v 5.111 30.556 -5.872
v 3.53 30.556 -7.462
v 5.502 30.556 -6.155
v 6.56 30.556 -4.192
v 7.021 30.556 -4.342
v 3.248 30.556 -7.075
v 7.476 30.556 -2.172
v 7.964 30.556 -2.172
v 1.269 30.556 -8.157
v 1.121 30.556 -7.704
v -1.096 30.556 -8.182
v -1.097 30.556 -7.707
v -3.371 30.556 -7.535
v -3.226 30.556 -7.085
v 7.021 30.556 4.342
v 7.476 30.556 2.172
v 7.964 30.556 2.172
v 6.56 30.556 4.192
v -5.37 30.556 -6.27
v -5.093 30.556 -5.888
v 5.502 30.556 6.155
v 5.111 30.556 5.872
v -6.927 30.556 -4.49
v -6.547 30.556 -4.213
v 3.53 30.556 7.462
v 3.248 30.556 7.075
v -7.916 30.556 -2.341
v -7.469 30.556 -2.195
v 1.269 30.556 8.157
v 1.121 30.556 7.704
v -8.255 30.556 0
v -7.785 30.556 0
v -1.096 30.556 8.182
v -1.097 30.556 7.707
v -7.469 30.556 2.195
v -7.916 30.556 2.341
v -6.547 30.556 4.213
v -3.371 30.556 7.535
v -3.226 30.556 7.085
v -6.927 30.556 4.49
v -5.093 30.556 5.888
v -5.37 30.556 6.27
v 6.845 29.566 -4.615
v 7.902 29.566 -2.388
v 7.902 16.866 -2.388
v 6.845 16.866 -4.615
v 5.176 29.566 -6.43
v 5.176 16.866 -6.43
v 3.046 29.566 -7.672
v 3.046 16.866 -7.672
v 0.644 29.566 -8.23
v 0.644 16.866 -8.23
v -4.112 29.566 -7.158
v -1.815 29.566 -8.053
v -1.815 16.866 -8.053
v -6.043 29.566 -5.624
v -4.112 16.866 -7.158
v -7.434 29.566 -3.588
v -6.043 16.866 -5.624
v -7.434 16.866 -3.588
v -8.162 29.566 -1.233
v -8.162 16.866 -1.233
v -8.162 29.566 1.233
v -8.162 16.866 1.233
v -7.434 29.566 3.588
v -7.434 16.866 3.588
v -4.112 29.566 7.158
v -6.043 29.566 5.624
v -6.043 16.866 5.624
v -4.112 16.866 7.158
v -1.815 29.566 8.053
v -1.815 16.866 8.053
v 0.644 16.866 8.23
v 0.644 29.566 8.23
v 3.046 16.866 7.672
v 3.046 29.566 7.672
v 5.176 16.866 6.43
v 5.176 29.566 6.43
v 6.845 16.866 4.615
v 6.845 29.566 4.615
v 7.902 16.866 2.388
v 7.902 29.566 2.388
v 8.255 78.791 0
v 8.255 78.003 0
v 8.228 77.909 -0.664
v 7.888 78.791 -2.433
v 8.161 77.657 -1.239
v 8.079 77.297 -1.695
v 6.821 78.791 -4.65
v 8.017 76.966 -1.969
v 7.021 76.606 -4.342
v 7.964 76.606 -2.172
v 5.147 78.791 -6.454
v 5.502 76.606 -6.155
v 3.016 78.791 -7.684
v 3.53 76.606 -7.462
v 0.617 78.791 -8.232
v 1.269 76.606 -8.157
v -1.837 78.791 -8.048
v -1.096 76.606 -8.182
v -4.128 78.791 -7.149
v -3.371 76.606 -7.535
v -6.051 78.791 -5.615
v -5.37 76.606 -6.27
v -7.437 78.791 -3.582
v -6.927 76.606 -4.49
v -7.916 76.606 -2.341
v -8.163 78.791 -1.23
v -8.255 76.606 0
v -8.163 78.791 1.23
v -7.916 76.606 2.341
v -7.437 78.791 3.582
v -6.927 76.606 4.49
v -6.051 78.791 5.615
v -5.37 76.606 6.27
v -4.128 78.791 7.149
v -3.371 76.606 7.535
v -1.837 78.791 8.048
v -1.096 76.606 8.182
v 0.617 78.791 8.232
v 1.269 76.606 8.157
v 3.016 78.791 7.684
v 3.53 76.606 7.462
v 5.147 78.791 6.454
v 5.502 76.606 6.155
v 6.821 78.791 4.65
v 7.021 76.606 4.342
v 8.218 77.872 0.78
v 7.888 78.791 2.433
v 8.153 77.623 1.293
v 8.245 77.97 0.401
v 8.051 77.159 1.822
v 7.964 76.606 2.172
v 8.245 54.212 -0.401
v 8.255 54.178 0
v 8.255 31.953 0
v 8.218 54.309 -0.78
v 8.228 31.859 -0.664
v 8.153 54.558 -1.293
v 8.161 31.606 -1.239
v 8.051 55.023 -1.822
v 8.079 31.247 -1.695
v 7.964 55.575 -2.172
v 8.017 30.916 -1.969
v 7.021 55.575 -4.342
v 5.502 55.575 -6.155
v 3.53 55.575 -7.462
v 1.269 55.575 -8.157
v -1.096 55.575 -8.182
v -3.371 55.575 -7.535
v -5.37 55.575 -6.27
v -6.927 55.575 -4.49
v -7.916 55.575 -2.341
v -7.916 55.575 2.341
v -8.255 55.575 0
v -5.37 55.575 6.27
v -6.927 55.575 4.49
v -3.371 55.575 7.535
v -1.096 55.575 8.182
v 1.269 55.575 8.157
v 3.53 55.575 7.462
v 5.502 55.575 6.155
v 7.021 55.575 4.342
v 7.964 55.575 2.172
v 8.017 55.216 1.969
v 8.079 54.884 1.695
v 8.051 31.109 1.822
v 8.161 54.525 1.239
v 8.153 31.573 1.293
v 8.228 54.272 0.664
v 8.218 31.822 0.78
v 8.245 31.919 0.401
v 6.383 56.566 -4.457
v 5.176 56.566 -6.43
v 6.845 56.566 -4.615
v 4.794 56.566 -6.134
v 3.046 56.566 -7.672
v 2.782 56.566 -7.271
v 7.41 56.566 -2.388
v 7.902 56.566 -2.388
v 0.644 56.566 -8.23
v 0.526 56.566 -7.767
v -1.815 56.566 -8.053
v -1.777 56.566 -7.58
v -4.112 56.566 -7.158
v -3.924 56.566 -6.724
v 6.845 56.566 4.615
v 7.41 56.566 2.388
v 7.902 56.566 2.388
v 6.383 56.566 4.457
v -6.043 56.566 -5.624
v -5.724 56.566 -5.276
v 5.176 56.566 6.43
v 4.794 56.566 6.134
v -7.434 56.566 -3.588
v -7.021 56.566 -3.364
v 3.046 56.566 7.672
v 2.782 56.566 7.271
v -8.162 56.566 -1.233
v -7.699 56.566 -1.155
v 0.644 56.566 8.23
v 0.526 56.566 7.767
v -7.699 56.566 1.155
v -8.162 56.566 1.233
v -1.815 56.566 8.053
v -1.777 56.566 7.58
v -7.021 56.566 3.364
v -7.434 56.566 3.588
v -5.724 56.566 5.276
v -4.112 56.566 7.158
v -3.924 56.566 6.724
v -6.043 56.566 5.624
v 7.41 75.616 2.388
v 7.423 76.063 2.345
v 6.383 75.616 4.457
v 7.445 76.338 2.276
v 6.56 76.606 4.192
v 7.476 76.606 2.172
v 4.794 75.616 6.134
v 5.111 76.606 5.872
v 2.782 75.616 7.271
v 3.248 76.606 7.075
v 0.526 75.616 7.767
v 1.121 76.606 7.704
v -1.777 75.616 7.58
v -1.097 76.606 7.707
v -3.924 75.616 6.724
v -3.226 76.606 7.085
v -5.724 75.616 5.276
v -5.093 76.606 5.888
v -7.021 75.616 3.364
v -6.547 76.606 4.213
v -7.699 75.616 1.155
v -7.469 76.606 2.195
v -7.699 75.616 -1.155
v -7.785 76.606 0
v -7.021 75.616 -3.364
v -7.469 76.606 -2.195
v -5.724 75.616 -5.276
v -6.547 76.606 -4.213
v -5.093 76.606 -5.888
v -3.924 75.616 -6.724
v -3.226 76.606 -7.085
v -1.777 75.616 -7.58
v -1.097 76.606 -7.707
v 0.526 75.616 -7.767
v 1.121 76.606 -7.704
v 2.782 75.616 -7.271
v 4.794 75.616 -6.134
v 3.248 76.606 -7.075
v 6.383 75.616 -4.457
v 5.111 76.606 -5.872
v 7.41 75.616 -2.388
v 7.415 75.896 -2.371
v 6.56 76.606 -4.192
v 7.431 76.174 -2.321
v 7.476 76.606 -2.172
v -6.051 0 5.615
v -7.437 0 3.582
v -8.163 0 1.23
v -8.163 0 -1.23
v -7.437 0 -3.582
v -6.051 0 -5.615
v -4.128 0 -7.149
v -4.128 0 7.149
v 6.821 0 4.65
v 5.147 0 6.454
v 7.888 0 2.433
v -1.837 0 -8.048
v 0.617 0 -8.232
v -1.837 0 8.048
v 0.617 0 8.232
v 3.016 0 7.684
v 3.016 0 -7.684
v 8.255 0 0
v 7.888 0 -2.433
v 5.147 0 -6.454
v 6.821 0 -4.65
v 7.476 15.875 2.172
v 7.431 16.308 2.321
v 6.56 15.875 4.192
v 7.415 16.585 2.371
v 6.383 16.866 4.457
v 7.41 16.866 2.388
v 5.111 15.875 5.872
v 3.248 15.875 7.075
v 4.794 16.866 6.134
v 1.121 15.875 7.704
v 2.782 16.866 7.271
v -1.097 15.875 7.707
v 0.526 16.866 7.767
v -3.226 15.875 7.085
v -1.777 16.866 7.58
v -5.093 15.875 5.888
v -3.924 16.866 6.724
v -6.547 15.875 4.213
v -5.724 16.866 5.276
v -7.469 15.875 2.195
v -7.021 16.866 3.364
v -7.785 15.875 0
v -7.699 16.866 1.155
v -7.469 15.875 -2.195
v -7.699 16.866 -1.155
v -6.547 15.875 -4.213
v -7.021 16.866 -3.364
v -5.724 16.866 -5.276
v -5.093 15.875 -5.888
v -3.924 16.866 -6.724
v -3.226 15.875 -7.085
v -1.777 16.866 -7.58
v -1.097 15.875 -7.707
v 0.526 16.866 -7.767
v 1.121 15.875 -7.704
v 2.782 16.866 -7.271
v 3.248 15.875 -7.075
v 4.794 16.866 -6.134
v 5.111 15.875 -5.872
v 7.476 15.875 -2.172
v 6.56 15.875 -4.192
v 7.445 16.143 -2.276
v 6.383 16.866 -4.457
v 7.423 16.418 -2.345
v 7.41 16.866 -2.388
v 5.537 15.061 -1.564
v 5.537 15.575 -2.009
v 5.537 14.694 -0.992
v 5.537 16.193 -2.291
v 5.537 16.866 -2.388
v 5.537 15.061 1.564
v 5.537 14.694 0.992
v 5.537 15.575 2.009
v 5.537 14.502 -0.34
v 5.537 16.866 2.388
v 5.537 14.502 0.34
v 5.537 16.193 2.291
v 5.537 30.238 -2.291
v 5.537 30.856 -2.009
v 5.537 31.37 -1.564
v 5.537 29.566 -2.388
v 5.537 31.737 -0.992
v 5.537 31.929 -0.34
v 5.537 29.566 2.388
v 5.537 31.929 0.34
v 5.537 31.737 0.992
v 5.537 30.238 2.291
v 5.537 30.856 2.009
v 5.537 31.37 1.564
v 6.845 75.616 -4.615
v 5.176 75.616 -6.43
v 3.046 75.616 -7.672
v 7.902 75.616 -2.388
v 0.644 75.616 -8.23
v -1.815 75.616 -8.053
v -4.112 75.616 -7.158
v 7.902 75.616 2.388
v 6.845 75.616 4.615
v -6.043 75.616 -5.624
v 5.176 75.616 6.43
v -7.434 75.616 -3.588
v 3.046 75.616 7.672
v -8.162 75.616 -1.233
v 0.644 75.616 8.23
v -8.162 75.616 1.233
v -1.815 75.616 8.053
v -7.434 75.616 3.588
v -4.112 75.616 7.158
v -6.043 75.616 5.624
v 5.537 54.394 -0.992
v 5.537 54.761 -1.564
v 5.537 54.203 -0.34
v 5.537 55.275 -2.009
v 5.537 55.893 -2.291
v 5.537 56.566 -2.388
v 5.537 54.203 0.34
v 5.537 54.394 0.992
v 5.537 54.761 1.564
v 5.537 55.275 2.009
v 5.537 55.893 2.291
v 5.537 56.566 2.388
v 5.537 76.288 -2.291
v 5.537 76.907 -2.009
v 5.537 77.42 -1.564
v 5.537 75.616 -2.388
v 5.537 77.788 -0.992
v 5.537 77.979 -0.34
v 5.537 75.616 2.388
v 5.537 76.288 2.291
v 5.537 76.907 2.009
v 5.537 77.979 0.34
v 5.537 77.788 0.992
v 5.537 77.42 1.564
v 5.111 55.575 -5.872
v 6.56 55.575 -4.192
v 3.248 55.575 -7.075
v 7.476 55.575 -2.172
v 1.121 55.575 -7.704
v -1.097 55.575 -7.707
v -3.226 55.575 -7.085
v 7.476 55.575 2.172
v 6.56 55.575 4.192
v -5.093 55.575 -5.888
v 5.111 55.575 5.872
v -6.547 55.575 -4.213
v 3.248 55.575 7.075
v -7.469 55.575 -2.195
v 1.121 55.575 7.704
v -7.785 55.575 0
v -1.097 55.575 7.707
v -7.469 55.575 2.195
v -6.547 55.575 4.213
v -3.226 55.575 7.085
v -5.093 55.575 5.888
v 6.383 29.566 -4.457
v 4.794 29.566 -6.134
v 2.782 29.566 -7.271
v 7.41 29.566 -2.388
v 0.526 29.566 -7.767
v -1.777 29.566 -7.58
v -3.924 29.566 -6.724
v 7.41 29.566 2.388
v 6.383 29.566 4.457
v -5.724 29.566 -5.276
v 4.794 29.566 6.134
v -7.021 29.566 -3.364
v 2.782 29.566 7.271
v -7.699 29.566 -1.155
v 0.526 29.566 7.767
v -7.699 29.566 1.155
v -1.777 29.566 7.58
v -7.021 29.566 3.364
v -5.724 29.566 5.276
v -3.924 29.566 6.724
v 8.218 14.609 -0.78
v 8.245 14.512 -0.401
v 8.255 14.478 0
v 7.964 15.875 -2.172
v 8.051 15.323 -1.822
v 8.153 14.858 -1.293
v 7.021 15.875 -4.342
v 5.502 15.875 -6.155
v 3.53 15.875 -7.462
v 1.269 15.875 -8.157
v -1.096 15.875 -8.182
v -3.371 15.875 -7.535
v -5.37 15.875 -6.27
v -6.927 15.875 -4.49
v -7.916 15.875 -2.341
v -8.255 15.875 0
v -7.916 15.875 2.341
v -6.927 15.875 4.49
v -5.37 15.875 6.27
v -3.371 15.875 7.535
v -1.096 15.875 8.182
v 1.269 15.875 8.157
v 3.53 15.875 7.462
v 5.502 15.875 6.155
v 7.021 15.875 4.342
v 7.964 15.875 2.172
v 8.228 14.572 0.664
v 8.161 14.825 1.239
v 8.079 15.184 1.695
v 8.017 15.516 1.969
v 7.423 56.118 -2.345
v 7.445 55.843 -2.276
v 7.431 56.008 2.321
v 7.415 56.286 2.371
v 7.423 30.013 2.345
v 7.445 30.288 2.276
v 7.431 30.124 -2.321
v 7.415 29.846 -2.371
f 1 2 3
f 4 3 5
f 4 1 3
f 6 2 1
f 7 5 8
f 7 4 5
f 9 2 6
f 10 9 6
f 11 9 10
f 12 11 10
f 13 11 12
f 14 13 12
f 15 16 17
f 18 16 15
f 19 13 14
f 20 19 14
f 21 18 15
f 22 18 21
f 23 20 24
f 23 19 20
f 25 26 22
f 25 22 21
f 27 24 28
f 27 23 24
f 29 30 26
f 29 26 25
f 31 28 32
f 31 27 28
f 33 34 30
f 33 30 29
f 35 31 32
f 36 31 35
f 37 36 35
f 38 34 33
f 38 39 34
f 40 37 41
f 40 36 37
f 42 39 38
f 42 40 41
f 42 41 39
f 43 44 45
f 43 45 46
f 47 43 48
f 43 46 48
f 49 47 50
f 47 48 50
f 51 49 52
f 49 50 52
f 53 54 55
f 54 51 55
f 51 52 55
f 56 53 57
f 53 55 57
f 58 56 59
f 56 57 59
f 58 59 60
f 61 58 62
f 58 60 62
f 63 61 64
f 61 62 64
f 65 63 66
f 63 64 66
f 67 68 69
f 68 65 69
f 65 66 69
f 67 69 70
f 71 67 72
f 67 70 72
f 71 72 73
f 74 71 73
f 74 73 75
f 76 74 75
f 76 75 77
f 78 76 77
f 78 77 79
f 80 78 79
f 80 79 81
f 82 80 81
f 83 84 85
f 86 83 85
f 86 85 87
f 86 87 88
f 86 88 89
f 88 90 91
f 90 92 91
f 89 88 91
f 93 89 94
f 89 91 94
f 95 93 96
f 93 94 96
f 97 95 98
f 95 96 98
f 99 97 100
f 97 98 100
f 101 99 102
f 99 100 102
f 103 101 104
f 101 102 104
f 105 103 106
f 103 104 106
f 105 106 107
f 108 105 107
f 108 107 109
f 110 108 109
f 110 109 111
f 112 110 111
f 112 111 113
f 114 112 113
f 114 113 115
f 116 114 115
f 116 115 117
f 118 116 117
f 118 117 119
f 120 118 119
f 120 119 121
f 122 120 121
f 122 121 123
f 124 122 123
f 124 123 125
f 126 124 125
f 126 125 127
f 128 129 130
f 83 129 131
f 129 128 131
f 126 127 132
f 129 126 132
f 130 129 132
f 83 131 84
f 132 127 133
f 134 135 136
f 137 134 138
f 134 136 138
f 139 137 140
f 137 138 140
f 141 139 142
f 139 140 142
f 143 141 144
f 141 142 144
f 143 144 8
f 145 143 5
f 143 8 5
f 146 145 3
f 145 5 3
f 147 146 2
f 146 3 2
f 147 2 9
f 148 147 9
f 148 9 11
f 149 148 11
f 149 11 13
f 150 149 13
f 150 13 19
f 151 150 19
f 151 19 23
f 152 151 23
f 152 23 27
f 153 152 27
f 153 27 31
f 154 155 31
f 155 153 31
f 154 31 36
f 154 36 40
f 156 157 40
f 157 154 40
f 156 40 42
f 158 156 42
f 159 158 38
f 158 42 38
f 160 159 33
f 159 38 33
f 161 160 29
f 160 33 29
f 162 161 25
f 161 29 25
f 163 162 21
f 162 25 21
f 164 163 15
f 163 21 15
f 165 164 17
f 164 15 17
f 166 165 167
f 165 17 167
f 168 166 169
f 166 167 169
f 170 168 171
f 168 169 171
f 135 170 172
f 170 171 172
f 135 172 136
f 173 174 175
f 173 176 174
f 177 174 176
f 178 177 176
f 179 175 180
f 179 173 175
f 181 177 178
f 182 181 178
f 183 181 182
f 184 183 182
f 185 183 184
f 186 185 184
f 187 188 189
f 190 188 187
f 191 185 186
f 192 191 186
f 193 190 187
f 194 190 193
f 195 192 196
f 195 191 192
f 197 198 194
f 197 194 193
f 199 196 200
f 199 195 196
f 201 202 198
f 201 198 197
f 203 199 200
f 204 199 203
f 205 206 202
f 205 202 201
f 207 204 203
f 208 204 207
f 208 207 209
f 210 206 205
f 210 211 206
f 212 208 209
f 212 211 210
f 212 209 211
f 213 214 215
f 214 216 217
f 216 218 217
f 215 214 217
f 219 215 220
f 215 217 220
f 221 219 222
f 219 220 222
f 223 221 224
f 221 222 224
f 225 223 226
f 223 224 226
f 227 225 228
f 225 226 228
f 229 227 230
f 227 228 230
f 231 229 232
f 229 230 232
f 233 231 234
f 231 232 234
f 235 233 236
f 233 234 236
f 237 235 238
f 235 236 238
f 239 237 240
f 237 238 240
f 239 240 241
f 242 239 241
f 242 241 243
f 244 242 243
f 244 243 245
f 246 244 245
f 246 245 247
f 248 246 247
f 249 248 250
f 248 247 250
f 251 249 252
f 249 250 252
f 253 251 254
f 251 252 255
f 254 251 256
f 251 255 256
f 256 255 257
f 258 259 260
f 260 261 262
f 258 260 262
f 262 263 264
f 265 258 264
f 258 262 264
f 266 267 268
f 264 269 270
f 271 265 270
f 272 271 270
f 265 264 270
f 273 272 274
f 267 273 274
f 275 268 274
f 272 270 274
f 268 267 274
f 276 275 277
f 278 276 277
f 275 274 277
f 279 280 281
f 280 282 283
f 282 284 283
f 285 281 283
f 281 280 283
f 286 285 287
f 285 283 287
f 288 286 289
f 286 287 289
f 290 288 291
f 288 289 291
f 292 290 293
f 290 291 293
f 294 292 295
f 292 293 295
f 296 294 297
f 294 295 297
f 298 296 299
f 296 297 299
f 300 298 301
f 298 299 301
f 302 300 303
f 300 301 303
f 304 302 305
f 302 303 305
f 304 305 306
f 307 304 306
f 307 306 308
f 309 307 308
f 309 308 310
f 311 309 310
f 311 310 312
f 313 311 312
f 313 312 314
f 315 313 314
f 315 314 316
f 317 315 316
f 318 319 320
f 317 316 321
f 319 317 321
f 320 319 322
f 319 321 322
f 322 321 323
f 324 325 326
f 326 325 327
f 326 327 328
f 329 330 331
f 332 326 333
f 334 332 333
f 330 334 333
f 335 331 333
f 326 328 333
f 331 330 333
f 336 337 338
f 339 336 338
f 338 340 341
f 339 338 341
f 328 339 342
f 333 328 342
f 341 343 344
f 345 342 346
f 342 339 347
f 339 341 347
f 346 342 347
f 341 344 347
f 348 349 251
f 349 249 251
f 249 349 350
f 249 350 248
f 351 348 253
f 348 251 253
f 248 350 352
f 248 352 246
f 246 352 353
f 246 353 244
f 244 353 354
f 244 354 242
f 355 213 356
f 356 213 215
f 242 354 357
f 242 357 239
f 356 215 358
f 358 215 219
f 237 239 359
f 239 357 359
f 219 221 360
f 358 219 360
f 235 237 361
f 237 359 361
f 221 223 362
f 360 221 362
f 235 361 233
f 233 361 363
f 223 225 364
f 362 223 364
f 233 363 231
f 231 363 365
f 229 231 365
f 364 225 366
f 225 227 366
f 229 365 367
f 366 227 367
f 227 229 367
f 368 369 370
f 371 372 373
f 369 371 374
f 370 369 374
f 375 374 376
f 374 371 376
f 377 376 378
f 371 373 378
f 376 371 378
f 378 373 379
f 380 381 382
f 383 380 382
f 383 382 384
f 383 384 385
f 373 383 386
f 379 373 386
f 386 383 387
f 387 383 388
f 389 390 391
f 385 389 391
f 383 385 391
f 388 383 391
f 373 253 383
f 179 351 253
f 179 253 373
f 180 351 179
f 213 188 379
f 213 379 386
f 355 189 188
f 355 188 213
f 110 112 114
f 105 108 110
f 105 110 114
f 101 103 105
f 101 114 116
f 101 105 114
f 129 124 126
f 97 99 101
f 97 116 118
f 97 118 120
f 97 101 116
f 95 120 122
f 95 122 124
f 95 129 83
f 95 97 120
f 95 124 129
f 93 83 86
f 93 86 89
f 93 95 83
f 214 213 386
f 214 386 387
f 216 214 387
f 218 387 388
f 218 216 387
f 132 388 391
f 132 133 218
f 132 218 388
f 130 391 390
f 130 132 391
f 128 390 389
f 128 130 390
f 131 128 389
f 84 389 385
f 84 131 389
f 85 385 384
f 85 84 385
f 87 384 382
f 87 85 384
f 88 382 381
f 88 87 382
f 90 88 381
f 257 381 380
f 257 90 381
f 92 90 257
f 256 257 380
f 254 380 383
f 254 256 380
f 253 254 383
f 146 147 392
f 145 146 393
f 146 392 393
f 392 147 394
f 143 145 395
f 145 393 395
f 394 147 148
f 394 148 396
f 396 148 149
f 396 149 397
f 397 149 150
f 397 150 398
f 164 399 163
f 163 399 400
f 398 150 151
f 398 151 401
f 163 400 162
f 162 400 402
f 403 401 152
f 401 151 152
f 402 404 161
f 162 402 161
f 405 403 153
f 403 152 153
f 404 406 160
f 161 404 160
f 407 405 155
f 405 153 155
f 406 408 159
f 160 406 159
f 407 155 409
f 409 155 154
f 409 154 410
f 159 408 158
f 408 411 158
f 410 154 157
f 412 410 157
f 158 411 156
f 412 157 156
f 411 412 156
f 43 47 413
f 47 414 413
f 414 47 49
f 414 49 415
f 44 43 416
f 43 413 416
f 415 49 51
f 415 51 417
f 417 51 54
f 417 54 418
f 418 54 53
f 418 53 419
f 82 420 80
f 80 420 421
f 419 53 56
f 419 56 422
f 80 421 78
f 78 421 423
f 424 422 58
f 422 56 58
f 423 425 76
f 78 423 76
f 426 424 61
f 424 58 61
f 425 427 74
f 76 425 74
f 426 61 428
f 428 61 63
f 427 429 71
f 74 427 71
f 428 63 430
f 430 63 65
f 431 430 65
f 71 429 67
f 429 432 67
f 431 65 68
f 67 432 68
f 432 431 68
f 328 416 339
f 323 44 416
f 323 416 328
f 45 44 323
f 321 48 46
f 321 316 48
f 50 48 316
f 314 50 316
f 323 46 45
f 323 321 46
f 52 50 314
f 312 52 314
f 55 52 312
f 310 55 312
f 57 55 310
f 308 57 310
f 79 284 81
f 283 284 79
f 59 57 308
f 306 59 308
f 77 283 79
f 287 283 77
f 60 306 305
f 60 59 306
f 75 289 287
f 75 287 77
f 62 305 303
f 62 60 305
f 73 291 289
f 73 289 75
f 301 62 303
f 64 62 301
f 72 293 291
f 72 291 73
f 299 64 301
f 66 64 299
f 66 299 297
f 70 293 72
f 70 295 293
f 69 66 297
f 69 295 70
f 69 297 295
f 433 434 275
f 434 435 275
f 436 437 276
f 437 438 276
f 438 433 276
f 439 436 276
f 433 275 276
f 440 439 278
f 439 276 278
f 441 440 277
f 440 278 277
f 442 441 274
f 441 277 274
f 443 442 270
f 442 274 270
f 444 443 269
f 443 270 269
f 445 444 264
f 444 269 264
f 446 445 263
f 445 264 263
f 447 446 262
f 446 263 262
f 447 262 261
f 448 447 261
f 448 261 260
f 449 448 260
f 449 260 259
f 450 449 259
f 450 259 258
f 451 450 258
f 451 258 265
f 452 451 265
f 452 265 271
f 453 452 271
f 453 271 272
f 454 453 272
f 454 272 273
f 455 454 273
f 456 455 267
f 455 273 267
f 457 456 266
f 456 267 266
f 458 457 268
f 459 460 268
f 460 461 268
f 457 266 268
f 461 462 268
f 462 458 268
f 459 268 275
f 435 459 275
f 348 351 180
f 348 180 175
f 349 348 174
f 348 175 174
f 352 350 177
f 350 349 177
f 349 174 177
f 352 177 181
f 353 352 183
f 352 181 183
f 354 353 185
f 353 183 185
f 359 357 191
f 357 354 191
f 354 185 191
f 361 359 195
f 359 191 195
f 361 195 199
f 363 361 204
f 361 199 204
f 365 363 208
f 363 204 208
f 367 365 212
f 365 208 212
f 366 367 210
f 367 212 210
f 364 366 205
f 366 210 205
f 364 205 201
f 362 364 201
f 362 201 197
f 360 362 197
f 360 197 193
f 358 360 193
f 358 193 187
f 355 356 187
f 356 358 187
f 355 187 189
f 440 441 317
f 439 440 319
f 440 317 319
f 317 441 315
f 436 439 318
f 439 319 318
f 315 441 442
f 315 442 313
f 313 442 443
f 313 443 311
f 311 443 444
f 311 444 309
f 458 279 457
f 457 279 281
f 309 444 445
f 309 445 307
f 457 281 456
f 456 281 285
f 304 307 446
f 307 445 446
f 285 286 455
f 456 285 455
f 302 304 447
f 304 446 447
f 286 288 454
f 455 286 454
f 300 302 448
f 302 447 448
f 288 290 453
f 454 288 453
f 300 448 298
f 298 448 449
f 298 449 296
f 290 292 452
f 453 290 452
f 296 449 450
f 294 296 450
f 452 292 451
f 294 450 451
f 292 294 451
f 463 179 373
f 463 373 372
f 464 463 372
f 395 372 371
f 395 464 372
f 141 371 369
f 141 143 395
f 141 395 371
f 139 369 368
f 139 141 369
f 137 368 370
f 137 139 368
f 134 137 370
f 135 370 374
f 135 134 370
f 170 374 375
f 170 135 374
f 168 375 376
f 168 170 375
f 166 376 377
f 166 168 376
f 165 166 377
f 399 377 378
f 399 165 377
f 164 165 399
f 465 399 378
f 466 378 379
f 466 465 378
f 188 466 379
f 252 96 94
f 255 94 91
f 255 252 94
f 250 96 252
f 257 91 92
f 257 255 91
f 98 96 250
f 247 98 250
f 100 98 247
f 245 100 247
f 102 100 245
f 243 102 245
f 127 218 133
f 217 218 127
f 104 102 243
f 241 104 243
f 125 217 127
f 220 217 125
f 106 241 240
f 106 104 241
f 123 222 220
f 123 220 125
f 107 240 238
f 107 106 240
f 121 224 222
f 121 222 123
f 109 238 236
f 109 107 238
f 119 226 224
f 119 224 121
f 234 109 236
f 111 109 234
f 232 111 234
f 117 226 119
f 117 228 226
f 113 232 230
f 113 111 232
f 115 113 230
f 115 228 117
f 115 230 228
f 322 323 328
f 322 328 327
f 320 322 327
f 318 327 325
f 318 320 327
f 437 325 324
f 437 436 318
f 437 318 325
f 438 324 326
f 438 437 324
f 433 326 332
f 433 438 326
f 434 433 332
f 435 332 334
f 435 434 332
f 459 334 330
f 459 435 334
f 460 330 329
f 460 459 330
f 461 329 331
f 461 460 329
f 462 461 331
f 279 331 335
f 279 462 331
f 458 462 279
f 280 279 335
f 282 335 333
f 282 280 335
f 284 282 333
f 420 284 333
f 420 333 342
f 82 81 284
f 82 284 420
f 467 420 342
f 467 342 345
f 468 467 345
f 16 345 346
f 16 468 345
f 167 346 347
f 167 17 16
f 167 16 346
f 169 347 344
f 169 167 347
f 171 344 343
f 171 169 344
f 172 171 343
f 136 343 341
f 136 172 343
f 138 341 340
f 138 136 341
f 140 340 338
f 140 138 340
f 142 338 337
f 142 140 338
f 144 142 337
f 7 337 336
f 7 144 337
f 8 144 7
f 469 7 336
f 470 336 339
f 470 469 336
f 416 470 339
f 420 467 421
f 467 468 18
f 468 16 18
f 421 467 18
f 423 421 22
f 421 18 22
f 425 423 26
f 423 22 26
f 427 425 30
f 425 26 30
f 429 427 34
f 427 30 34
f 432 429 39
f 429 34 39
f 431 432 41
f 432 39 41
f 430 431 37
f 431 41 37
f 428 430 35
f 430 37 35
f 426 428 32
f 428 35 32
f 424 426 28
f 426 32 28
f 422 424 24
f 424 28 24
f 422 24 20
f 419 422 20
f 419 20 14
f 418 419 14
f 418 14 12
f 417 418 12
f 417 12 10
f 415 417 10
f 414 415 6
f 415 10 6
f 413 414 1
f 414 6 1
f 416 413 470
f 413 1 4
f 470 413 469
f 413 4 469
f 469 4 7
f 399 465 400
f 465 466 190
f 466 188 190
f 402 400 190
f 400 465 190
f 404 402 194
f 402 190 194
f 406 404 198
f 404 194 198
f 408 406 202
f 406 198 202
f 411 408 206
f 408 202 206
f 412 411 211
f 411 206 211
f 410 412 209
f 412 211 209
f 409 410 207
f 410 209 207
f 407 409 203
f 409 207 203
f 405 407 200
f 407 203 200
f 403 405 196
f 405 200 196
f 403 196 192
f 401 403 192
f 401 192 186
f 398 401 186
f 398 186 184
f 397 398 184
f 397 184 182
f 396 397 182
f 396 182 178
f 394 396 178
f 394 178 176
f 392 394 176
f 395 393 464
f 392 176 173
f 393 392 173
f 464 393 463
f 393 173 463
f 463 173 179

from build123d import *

# Parameters (mm, degrees)
SKETCH1_R           = 8.255
BOSS_EXTRUDE1_DEPTH = 78.7908
SKETCH3_W           = 28.144543877
SKETCH3_H           = 0.9906
SKETCH4_W           = 12.873525148
SKETCH4_H           = 0.9906
SKETCH5_W           = 18.510298187
SKETCH5_H           = 0.9906
SKETCH6_W           = 13.338836726
SKETCH6_H           = 0.9906
CUT_EXTRUDE2_DEPTH  = 2.7432
CUT_EXTRUDE3_DEPTH  = 2.7432


with BuildPart() as part:
    # Sketch1 → Boss-Extrude1 (new body)
    with BuildSketch(Plane(origin=(0, 0, 0), x_dir=(1, 0, 0), z_dir=(0, 1, 0))):
        Circle(SKETCH1_R)
    extrude(amount=BOSS_EXTRUDE1_DEPTH)

    # Sketch3 → Cut-Revolve1 (revolve, cut)
    with BuildSketch(Plane(origin=(0, 0, 0), x_dir=(0, 0, -1), z_dir=(1, 0, 0))):
        with Locations((-21.857371939, 16.3703)):
            Rectangle(SKETCH3_W, SKETCH3_H)
    revolve(axis=Axis((0, 29.927318778, 0), (0, -1, 0)), mode=Mode.SUBTRACT)

    # Sketch4 → Cut-Revolve2 (revolve, cut)
    with BuildSketch(Plane(origin=(0, 0, 0), x_dir=(0, 0, -1), z_dir=(1, 0, 0))):
        with Locations((-14.221862574, 30.0609)):
            Rectangle(SKETCH4_W, SKETCH4_H)
    revolve(axis=Axis((0, 33.790657772, 0), (0, -1, 0)), mode=Mode.SUBTRACT)

    # Sketch5 → Cut-Revolve3 (revolve, cut)
    with BuildSketch(Plane(origin=(0, 0, 0), x_dir=(0, 0, -1), z_dir=(1, 0, 0))):
        with Locations((-17.040249094, 56.0705)):
            Rectangle(SKETCH5_W, SKETCH5_H)
    revolve(axis=Axis((0, 60.607773061, 0), (0, -1, 0)), mode=Mode.SUBTRACT)

    # Sketch6 → Cut-Revolve4 (revolve, cut)
    with BuildSketch(Plane(origin=(0, 0, 0), x_dir=(0, 0, -1), z_dir=(1, 0, 0))):
        with Locations((-14.454518363, 76.1111)):
            Rectangle(SKETCH6_W, SKETCH6_H)
    revolve(axis=Axis((0, 77.155375287, 0), (0, -1, 0)), mode=Mode.SUBTRACT)

    # Sketch7 → Cut-Extrude2 (cut)
    with BuildSketch(Plane(origin=(8.2804, 0, 0), x_dir=(0, 0, -1), z_dir=(1, 0, 0))):
        with BuildLine():
            Line((2.3876, 75.6158), (2.3876, 56.5658))
            ThreePointArc((2.3876, 56.5658), (0, 54.1782), (-2.3876, 56.5658))
            Line((-2.3876, 56.5658), (-2.3876, 75.6158))
            ThreePointArc((-2.3876, 75.6158), (0, 78.0034), (2.3876, 75.6158))
        make_face()
    extrude(amount=-CUT_EXTRUDE2_DEPTH, mode=Mode.SUBTRACT)

    # Sketch8 → Cut-Extrude3 (cut)
    with BuildSketch(Plane(origin=(8.2804, 0, 0), x_dir=(0, 0, -1), z_dir=(1, 0, 0))):
        with BuildLine():
            Line((2.3876, 29.5656), (2.3876, 16.8656))
            ThreePointArc((2.3876, 16.8656), (0, 14.478), (-2.3876, 16.8656))
            Line((-2.3876, 16.8656), (-2.3876, 29.5656))
            ThreePointArc((-2.3876, 29.5656), (0, 31.9532), (2.3876, 29.5656))
        make_face()
    extrude(amount=-CUT_EXTRUDE3_DEPTH, mode=Mode.SUBTRACT)


solid = part.part
